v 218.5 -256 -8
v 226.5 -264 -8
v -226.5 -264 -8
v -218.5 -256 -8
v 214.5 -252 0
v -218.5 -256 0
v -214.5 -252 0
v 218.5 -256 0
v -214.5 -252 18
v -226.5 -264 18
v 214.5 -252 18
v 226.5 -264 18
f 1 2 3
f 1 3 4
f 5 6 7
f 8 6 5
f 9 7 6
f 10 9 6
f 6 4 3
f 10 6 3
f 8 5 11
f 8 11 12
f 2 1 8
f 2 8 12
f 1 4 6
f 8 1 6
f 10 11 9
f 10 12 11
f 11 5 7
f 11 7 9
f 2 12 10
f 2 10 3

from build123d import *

# Parameters (mm, degrees)
PAD003_DEPTH         = 350
POCKET002_DEPTH      = 8.001
POCKET002_DEPTH_BACK = 30.001
SKETCH008_W          = 12
SKETCH008_H          = 12
POCKET003_DEPTH      = 226.501
POCKET003_DEPTH_BACK = 226.501


with BuildPart() as part:
    # Sketch005 → Pad003 (new body, symmetric)
    with BuildSketch(Plane.YZ):
        Polygon((-252, 0), (-252, 30), (-264, 25.632357), (-264, -8), (-256, -8), (-256, 0), align=None)
    extrude(amount=PAD003_DEPTH, both=True)

    # Sketch006 → Pocket002 (cut, two sides)
    with BuildSketch(Plane.XY) as pocket002_sk:
        Polygon((-350, -264), (-350, -252), (-214.5, -252), (-226.5, -264), align=None)
        Polygon((350, -264), (350, -252), (214.5, -252), (226.5, -264), align=None)
    extrude(amount=-POCKET002_DEPTH, mode=Mode.SUBTRACT)
    extrude(pocket002_sk.sketch, amount=POCKET002_DEPTH_BACK, mode=Mode.SUBTRACT)

    # Sketch008 → Pocket003 (cut, two sides)
    with BuildSketch(Plane.YZ) as pocket003_sk:
        with Locations((-258, 24)):
            Rectangle(SKETCH008_W, SKETCH008_H)
    extrude(amount=-POCKET003_DEPTH, mode=Mode.SUBTRACT)
    extrude(pocket003_sk.sketch, amount=POCKET003_DEPTH_BACK, mode=Mode.SUBTRACT)


solid = part.part
